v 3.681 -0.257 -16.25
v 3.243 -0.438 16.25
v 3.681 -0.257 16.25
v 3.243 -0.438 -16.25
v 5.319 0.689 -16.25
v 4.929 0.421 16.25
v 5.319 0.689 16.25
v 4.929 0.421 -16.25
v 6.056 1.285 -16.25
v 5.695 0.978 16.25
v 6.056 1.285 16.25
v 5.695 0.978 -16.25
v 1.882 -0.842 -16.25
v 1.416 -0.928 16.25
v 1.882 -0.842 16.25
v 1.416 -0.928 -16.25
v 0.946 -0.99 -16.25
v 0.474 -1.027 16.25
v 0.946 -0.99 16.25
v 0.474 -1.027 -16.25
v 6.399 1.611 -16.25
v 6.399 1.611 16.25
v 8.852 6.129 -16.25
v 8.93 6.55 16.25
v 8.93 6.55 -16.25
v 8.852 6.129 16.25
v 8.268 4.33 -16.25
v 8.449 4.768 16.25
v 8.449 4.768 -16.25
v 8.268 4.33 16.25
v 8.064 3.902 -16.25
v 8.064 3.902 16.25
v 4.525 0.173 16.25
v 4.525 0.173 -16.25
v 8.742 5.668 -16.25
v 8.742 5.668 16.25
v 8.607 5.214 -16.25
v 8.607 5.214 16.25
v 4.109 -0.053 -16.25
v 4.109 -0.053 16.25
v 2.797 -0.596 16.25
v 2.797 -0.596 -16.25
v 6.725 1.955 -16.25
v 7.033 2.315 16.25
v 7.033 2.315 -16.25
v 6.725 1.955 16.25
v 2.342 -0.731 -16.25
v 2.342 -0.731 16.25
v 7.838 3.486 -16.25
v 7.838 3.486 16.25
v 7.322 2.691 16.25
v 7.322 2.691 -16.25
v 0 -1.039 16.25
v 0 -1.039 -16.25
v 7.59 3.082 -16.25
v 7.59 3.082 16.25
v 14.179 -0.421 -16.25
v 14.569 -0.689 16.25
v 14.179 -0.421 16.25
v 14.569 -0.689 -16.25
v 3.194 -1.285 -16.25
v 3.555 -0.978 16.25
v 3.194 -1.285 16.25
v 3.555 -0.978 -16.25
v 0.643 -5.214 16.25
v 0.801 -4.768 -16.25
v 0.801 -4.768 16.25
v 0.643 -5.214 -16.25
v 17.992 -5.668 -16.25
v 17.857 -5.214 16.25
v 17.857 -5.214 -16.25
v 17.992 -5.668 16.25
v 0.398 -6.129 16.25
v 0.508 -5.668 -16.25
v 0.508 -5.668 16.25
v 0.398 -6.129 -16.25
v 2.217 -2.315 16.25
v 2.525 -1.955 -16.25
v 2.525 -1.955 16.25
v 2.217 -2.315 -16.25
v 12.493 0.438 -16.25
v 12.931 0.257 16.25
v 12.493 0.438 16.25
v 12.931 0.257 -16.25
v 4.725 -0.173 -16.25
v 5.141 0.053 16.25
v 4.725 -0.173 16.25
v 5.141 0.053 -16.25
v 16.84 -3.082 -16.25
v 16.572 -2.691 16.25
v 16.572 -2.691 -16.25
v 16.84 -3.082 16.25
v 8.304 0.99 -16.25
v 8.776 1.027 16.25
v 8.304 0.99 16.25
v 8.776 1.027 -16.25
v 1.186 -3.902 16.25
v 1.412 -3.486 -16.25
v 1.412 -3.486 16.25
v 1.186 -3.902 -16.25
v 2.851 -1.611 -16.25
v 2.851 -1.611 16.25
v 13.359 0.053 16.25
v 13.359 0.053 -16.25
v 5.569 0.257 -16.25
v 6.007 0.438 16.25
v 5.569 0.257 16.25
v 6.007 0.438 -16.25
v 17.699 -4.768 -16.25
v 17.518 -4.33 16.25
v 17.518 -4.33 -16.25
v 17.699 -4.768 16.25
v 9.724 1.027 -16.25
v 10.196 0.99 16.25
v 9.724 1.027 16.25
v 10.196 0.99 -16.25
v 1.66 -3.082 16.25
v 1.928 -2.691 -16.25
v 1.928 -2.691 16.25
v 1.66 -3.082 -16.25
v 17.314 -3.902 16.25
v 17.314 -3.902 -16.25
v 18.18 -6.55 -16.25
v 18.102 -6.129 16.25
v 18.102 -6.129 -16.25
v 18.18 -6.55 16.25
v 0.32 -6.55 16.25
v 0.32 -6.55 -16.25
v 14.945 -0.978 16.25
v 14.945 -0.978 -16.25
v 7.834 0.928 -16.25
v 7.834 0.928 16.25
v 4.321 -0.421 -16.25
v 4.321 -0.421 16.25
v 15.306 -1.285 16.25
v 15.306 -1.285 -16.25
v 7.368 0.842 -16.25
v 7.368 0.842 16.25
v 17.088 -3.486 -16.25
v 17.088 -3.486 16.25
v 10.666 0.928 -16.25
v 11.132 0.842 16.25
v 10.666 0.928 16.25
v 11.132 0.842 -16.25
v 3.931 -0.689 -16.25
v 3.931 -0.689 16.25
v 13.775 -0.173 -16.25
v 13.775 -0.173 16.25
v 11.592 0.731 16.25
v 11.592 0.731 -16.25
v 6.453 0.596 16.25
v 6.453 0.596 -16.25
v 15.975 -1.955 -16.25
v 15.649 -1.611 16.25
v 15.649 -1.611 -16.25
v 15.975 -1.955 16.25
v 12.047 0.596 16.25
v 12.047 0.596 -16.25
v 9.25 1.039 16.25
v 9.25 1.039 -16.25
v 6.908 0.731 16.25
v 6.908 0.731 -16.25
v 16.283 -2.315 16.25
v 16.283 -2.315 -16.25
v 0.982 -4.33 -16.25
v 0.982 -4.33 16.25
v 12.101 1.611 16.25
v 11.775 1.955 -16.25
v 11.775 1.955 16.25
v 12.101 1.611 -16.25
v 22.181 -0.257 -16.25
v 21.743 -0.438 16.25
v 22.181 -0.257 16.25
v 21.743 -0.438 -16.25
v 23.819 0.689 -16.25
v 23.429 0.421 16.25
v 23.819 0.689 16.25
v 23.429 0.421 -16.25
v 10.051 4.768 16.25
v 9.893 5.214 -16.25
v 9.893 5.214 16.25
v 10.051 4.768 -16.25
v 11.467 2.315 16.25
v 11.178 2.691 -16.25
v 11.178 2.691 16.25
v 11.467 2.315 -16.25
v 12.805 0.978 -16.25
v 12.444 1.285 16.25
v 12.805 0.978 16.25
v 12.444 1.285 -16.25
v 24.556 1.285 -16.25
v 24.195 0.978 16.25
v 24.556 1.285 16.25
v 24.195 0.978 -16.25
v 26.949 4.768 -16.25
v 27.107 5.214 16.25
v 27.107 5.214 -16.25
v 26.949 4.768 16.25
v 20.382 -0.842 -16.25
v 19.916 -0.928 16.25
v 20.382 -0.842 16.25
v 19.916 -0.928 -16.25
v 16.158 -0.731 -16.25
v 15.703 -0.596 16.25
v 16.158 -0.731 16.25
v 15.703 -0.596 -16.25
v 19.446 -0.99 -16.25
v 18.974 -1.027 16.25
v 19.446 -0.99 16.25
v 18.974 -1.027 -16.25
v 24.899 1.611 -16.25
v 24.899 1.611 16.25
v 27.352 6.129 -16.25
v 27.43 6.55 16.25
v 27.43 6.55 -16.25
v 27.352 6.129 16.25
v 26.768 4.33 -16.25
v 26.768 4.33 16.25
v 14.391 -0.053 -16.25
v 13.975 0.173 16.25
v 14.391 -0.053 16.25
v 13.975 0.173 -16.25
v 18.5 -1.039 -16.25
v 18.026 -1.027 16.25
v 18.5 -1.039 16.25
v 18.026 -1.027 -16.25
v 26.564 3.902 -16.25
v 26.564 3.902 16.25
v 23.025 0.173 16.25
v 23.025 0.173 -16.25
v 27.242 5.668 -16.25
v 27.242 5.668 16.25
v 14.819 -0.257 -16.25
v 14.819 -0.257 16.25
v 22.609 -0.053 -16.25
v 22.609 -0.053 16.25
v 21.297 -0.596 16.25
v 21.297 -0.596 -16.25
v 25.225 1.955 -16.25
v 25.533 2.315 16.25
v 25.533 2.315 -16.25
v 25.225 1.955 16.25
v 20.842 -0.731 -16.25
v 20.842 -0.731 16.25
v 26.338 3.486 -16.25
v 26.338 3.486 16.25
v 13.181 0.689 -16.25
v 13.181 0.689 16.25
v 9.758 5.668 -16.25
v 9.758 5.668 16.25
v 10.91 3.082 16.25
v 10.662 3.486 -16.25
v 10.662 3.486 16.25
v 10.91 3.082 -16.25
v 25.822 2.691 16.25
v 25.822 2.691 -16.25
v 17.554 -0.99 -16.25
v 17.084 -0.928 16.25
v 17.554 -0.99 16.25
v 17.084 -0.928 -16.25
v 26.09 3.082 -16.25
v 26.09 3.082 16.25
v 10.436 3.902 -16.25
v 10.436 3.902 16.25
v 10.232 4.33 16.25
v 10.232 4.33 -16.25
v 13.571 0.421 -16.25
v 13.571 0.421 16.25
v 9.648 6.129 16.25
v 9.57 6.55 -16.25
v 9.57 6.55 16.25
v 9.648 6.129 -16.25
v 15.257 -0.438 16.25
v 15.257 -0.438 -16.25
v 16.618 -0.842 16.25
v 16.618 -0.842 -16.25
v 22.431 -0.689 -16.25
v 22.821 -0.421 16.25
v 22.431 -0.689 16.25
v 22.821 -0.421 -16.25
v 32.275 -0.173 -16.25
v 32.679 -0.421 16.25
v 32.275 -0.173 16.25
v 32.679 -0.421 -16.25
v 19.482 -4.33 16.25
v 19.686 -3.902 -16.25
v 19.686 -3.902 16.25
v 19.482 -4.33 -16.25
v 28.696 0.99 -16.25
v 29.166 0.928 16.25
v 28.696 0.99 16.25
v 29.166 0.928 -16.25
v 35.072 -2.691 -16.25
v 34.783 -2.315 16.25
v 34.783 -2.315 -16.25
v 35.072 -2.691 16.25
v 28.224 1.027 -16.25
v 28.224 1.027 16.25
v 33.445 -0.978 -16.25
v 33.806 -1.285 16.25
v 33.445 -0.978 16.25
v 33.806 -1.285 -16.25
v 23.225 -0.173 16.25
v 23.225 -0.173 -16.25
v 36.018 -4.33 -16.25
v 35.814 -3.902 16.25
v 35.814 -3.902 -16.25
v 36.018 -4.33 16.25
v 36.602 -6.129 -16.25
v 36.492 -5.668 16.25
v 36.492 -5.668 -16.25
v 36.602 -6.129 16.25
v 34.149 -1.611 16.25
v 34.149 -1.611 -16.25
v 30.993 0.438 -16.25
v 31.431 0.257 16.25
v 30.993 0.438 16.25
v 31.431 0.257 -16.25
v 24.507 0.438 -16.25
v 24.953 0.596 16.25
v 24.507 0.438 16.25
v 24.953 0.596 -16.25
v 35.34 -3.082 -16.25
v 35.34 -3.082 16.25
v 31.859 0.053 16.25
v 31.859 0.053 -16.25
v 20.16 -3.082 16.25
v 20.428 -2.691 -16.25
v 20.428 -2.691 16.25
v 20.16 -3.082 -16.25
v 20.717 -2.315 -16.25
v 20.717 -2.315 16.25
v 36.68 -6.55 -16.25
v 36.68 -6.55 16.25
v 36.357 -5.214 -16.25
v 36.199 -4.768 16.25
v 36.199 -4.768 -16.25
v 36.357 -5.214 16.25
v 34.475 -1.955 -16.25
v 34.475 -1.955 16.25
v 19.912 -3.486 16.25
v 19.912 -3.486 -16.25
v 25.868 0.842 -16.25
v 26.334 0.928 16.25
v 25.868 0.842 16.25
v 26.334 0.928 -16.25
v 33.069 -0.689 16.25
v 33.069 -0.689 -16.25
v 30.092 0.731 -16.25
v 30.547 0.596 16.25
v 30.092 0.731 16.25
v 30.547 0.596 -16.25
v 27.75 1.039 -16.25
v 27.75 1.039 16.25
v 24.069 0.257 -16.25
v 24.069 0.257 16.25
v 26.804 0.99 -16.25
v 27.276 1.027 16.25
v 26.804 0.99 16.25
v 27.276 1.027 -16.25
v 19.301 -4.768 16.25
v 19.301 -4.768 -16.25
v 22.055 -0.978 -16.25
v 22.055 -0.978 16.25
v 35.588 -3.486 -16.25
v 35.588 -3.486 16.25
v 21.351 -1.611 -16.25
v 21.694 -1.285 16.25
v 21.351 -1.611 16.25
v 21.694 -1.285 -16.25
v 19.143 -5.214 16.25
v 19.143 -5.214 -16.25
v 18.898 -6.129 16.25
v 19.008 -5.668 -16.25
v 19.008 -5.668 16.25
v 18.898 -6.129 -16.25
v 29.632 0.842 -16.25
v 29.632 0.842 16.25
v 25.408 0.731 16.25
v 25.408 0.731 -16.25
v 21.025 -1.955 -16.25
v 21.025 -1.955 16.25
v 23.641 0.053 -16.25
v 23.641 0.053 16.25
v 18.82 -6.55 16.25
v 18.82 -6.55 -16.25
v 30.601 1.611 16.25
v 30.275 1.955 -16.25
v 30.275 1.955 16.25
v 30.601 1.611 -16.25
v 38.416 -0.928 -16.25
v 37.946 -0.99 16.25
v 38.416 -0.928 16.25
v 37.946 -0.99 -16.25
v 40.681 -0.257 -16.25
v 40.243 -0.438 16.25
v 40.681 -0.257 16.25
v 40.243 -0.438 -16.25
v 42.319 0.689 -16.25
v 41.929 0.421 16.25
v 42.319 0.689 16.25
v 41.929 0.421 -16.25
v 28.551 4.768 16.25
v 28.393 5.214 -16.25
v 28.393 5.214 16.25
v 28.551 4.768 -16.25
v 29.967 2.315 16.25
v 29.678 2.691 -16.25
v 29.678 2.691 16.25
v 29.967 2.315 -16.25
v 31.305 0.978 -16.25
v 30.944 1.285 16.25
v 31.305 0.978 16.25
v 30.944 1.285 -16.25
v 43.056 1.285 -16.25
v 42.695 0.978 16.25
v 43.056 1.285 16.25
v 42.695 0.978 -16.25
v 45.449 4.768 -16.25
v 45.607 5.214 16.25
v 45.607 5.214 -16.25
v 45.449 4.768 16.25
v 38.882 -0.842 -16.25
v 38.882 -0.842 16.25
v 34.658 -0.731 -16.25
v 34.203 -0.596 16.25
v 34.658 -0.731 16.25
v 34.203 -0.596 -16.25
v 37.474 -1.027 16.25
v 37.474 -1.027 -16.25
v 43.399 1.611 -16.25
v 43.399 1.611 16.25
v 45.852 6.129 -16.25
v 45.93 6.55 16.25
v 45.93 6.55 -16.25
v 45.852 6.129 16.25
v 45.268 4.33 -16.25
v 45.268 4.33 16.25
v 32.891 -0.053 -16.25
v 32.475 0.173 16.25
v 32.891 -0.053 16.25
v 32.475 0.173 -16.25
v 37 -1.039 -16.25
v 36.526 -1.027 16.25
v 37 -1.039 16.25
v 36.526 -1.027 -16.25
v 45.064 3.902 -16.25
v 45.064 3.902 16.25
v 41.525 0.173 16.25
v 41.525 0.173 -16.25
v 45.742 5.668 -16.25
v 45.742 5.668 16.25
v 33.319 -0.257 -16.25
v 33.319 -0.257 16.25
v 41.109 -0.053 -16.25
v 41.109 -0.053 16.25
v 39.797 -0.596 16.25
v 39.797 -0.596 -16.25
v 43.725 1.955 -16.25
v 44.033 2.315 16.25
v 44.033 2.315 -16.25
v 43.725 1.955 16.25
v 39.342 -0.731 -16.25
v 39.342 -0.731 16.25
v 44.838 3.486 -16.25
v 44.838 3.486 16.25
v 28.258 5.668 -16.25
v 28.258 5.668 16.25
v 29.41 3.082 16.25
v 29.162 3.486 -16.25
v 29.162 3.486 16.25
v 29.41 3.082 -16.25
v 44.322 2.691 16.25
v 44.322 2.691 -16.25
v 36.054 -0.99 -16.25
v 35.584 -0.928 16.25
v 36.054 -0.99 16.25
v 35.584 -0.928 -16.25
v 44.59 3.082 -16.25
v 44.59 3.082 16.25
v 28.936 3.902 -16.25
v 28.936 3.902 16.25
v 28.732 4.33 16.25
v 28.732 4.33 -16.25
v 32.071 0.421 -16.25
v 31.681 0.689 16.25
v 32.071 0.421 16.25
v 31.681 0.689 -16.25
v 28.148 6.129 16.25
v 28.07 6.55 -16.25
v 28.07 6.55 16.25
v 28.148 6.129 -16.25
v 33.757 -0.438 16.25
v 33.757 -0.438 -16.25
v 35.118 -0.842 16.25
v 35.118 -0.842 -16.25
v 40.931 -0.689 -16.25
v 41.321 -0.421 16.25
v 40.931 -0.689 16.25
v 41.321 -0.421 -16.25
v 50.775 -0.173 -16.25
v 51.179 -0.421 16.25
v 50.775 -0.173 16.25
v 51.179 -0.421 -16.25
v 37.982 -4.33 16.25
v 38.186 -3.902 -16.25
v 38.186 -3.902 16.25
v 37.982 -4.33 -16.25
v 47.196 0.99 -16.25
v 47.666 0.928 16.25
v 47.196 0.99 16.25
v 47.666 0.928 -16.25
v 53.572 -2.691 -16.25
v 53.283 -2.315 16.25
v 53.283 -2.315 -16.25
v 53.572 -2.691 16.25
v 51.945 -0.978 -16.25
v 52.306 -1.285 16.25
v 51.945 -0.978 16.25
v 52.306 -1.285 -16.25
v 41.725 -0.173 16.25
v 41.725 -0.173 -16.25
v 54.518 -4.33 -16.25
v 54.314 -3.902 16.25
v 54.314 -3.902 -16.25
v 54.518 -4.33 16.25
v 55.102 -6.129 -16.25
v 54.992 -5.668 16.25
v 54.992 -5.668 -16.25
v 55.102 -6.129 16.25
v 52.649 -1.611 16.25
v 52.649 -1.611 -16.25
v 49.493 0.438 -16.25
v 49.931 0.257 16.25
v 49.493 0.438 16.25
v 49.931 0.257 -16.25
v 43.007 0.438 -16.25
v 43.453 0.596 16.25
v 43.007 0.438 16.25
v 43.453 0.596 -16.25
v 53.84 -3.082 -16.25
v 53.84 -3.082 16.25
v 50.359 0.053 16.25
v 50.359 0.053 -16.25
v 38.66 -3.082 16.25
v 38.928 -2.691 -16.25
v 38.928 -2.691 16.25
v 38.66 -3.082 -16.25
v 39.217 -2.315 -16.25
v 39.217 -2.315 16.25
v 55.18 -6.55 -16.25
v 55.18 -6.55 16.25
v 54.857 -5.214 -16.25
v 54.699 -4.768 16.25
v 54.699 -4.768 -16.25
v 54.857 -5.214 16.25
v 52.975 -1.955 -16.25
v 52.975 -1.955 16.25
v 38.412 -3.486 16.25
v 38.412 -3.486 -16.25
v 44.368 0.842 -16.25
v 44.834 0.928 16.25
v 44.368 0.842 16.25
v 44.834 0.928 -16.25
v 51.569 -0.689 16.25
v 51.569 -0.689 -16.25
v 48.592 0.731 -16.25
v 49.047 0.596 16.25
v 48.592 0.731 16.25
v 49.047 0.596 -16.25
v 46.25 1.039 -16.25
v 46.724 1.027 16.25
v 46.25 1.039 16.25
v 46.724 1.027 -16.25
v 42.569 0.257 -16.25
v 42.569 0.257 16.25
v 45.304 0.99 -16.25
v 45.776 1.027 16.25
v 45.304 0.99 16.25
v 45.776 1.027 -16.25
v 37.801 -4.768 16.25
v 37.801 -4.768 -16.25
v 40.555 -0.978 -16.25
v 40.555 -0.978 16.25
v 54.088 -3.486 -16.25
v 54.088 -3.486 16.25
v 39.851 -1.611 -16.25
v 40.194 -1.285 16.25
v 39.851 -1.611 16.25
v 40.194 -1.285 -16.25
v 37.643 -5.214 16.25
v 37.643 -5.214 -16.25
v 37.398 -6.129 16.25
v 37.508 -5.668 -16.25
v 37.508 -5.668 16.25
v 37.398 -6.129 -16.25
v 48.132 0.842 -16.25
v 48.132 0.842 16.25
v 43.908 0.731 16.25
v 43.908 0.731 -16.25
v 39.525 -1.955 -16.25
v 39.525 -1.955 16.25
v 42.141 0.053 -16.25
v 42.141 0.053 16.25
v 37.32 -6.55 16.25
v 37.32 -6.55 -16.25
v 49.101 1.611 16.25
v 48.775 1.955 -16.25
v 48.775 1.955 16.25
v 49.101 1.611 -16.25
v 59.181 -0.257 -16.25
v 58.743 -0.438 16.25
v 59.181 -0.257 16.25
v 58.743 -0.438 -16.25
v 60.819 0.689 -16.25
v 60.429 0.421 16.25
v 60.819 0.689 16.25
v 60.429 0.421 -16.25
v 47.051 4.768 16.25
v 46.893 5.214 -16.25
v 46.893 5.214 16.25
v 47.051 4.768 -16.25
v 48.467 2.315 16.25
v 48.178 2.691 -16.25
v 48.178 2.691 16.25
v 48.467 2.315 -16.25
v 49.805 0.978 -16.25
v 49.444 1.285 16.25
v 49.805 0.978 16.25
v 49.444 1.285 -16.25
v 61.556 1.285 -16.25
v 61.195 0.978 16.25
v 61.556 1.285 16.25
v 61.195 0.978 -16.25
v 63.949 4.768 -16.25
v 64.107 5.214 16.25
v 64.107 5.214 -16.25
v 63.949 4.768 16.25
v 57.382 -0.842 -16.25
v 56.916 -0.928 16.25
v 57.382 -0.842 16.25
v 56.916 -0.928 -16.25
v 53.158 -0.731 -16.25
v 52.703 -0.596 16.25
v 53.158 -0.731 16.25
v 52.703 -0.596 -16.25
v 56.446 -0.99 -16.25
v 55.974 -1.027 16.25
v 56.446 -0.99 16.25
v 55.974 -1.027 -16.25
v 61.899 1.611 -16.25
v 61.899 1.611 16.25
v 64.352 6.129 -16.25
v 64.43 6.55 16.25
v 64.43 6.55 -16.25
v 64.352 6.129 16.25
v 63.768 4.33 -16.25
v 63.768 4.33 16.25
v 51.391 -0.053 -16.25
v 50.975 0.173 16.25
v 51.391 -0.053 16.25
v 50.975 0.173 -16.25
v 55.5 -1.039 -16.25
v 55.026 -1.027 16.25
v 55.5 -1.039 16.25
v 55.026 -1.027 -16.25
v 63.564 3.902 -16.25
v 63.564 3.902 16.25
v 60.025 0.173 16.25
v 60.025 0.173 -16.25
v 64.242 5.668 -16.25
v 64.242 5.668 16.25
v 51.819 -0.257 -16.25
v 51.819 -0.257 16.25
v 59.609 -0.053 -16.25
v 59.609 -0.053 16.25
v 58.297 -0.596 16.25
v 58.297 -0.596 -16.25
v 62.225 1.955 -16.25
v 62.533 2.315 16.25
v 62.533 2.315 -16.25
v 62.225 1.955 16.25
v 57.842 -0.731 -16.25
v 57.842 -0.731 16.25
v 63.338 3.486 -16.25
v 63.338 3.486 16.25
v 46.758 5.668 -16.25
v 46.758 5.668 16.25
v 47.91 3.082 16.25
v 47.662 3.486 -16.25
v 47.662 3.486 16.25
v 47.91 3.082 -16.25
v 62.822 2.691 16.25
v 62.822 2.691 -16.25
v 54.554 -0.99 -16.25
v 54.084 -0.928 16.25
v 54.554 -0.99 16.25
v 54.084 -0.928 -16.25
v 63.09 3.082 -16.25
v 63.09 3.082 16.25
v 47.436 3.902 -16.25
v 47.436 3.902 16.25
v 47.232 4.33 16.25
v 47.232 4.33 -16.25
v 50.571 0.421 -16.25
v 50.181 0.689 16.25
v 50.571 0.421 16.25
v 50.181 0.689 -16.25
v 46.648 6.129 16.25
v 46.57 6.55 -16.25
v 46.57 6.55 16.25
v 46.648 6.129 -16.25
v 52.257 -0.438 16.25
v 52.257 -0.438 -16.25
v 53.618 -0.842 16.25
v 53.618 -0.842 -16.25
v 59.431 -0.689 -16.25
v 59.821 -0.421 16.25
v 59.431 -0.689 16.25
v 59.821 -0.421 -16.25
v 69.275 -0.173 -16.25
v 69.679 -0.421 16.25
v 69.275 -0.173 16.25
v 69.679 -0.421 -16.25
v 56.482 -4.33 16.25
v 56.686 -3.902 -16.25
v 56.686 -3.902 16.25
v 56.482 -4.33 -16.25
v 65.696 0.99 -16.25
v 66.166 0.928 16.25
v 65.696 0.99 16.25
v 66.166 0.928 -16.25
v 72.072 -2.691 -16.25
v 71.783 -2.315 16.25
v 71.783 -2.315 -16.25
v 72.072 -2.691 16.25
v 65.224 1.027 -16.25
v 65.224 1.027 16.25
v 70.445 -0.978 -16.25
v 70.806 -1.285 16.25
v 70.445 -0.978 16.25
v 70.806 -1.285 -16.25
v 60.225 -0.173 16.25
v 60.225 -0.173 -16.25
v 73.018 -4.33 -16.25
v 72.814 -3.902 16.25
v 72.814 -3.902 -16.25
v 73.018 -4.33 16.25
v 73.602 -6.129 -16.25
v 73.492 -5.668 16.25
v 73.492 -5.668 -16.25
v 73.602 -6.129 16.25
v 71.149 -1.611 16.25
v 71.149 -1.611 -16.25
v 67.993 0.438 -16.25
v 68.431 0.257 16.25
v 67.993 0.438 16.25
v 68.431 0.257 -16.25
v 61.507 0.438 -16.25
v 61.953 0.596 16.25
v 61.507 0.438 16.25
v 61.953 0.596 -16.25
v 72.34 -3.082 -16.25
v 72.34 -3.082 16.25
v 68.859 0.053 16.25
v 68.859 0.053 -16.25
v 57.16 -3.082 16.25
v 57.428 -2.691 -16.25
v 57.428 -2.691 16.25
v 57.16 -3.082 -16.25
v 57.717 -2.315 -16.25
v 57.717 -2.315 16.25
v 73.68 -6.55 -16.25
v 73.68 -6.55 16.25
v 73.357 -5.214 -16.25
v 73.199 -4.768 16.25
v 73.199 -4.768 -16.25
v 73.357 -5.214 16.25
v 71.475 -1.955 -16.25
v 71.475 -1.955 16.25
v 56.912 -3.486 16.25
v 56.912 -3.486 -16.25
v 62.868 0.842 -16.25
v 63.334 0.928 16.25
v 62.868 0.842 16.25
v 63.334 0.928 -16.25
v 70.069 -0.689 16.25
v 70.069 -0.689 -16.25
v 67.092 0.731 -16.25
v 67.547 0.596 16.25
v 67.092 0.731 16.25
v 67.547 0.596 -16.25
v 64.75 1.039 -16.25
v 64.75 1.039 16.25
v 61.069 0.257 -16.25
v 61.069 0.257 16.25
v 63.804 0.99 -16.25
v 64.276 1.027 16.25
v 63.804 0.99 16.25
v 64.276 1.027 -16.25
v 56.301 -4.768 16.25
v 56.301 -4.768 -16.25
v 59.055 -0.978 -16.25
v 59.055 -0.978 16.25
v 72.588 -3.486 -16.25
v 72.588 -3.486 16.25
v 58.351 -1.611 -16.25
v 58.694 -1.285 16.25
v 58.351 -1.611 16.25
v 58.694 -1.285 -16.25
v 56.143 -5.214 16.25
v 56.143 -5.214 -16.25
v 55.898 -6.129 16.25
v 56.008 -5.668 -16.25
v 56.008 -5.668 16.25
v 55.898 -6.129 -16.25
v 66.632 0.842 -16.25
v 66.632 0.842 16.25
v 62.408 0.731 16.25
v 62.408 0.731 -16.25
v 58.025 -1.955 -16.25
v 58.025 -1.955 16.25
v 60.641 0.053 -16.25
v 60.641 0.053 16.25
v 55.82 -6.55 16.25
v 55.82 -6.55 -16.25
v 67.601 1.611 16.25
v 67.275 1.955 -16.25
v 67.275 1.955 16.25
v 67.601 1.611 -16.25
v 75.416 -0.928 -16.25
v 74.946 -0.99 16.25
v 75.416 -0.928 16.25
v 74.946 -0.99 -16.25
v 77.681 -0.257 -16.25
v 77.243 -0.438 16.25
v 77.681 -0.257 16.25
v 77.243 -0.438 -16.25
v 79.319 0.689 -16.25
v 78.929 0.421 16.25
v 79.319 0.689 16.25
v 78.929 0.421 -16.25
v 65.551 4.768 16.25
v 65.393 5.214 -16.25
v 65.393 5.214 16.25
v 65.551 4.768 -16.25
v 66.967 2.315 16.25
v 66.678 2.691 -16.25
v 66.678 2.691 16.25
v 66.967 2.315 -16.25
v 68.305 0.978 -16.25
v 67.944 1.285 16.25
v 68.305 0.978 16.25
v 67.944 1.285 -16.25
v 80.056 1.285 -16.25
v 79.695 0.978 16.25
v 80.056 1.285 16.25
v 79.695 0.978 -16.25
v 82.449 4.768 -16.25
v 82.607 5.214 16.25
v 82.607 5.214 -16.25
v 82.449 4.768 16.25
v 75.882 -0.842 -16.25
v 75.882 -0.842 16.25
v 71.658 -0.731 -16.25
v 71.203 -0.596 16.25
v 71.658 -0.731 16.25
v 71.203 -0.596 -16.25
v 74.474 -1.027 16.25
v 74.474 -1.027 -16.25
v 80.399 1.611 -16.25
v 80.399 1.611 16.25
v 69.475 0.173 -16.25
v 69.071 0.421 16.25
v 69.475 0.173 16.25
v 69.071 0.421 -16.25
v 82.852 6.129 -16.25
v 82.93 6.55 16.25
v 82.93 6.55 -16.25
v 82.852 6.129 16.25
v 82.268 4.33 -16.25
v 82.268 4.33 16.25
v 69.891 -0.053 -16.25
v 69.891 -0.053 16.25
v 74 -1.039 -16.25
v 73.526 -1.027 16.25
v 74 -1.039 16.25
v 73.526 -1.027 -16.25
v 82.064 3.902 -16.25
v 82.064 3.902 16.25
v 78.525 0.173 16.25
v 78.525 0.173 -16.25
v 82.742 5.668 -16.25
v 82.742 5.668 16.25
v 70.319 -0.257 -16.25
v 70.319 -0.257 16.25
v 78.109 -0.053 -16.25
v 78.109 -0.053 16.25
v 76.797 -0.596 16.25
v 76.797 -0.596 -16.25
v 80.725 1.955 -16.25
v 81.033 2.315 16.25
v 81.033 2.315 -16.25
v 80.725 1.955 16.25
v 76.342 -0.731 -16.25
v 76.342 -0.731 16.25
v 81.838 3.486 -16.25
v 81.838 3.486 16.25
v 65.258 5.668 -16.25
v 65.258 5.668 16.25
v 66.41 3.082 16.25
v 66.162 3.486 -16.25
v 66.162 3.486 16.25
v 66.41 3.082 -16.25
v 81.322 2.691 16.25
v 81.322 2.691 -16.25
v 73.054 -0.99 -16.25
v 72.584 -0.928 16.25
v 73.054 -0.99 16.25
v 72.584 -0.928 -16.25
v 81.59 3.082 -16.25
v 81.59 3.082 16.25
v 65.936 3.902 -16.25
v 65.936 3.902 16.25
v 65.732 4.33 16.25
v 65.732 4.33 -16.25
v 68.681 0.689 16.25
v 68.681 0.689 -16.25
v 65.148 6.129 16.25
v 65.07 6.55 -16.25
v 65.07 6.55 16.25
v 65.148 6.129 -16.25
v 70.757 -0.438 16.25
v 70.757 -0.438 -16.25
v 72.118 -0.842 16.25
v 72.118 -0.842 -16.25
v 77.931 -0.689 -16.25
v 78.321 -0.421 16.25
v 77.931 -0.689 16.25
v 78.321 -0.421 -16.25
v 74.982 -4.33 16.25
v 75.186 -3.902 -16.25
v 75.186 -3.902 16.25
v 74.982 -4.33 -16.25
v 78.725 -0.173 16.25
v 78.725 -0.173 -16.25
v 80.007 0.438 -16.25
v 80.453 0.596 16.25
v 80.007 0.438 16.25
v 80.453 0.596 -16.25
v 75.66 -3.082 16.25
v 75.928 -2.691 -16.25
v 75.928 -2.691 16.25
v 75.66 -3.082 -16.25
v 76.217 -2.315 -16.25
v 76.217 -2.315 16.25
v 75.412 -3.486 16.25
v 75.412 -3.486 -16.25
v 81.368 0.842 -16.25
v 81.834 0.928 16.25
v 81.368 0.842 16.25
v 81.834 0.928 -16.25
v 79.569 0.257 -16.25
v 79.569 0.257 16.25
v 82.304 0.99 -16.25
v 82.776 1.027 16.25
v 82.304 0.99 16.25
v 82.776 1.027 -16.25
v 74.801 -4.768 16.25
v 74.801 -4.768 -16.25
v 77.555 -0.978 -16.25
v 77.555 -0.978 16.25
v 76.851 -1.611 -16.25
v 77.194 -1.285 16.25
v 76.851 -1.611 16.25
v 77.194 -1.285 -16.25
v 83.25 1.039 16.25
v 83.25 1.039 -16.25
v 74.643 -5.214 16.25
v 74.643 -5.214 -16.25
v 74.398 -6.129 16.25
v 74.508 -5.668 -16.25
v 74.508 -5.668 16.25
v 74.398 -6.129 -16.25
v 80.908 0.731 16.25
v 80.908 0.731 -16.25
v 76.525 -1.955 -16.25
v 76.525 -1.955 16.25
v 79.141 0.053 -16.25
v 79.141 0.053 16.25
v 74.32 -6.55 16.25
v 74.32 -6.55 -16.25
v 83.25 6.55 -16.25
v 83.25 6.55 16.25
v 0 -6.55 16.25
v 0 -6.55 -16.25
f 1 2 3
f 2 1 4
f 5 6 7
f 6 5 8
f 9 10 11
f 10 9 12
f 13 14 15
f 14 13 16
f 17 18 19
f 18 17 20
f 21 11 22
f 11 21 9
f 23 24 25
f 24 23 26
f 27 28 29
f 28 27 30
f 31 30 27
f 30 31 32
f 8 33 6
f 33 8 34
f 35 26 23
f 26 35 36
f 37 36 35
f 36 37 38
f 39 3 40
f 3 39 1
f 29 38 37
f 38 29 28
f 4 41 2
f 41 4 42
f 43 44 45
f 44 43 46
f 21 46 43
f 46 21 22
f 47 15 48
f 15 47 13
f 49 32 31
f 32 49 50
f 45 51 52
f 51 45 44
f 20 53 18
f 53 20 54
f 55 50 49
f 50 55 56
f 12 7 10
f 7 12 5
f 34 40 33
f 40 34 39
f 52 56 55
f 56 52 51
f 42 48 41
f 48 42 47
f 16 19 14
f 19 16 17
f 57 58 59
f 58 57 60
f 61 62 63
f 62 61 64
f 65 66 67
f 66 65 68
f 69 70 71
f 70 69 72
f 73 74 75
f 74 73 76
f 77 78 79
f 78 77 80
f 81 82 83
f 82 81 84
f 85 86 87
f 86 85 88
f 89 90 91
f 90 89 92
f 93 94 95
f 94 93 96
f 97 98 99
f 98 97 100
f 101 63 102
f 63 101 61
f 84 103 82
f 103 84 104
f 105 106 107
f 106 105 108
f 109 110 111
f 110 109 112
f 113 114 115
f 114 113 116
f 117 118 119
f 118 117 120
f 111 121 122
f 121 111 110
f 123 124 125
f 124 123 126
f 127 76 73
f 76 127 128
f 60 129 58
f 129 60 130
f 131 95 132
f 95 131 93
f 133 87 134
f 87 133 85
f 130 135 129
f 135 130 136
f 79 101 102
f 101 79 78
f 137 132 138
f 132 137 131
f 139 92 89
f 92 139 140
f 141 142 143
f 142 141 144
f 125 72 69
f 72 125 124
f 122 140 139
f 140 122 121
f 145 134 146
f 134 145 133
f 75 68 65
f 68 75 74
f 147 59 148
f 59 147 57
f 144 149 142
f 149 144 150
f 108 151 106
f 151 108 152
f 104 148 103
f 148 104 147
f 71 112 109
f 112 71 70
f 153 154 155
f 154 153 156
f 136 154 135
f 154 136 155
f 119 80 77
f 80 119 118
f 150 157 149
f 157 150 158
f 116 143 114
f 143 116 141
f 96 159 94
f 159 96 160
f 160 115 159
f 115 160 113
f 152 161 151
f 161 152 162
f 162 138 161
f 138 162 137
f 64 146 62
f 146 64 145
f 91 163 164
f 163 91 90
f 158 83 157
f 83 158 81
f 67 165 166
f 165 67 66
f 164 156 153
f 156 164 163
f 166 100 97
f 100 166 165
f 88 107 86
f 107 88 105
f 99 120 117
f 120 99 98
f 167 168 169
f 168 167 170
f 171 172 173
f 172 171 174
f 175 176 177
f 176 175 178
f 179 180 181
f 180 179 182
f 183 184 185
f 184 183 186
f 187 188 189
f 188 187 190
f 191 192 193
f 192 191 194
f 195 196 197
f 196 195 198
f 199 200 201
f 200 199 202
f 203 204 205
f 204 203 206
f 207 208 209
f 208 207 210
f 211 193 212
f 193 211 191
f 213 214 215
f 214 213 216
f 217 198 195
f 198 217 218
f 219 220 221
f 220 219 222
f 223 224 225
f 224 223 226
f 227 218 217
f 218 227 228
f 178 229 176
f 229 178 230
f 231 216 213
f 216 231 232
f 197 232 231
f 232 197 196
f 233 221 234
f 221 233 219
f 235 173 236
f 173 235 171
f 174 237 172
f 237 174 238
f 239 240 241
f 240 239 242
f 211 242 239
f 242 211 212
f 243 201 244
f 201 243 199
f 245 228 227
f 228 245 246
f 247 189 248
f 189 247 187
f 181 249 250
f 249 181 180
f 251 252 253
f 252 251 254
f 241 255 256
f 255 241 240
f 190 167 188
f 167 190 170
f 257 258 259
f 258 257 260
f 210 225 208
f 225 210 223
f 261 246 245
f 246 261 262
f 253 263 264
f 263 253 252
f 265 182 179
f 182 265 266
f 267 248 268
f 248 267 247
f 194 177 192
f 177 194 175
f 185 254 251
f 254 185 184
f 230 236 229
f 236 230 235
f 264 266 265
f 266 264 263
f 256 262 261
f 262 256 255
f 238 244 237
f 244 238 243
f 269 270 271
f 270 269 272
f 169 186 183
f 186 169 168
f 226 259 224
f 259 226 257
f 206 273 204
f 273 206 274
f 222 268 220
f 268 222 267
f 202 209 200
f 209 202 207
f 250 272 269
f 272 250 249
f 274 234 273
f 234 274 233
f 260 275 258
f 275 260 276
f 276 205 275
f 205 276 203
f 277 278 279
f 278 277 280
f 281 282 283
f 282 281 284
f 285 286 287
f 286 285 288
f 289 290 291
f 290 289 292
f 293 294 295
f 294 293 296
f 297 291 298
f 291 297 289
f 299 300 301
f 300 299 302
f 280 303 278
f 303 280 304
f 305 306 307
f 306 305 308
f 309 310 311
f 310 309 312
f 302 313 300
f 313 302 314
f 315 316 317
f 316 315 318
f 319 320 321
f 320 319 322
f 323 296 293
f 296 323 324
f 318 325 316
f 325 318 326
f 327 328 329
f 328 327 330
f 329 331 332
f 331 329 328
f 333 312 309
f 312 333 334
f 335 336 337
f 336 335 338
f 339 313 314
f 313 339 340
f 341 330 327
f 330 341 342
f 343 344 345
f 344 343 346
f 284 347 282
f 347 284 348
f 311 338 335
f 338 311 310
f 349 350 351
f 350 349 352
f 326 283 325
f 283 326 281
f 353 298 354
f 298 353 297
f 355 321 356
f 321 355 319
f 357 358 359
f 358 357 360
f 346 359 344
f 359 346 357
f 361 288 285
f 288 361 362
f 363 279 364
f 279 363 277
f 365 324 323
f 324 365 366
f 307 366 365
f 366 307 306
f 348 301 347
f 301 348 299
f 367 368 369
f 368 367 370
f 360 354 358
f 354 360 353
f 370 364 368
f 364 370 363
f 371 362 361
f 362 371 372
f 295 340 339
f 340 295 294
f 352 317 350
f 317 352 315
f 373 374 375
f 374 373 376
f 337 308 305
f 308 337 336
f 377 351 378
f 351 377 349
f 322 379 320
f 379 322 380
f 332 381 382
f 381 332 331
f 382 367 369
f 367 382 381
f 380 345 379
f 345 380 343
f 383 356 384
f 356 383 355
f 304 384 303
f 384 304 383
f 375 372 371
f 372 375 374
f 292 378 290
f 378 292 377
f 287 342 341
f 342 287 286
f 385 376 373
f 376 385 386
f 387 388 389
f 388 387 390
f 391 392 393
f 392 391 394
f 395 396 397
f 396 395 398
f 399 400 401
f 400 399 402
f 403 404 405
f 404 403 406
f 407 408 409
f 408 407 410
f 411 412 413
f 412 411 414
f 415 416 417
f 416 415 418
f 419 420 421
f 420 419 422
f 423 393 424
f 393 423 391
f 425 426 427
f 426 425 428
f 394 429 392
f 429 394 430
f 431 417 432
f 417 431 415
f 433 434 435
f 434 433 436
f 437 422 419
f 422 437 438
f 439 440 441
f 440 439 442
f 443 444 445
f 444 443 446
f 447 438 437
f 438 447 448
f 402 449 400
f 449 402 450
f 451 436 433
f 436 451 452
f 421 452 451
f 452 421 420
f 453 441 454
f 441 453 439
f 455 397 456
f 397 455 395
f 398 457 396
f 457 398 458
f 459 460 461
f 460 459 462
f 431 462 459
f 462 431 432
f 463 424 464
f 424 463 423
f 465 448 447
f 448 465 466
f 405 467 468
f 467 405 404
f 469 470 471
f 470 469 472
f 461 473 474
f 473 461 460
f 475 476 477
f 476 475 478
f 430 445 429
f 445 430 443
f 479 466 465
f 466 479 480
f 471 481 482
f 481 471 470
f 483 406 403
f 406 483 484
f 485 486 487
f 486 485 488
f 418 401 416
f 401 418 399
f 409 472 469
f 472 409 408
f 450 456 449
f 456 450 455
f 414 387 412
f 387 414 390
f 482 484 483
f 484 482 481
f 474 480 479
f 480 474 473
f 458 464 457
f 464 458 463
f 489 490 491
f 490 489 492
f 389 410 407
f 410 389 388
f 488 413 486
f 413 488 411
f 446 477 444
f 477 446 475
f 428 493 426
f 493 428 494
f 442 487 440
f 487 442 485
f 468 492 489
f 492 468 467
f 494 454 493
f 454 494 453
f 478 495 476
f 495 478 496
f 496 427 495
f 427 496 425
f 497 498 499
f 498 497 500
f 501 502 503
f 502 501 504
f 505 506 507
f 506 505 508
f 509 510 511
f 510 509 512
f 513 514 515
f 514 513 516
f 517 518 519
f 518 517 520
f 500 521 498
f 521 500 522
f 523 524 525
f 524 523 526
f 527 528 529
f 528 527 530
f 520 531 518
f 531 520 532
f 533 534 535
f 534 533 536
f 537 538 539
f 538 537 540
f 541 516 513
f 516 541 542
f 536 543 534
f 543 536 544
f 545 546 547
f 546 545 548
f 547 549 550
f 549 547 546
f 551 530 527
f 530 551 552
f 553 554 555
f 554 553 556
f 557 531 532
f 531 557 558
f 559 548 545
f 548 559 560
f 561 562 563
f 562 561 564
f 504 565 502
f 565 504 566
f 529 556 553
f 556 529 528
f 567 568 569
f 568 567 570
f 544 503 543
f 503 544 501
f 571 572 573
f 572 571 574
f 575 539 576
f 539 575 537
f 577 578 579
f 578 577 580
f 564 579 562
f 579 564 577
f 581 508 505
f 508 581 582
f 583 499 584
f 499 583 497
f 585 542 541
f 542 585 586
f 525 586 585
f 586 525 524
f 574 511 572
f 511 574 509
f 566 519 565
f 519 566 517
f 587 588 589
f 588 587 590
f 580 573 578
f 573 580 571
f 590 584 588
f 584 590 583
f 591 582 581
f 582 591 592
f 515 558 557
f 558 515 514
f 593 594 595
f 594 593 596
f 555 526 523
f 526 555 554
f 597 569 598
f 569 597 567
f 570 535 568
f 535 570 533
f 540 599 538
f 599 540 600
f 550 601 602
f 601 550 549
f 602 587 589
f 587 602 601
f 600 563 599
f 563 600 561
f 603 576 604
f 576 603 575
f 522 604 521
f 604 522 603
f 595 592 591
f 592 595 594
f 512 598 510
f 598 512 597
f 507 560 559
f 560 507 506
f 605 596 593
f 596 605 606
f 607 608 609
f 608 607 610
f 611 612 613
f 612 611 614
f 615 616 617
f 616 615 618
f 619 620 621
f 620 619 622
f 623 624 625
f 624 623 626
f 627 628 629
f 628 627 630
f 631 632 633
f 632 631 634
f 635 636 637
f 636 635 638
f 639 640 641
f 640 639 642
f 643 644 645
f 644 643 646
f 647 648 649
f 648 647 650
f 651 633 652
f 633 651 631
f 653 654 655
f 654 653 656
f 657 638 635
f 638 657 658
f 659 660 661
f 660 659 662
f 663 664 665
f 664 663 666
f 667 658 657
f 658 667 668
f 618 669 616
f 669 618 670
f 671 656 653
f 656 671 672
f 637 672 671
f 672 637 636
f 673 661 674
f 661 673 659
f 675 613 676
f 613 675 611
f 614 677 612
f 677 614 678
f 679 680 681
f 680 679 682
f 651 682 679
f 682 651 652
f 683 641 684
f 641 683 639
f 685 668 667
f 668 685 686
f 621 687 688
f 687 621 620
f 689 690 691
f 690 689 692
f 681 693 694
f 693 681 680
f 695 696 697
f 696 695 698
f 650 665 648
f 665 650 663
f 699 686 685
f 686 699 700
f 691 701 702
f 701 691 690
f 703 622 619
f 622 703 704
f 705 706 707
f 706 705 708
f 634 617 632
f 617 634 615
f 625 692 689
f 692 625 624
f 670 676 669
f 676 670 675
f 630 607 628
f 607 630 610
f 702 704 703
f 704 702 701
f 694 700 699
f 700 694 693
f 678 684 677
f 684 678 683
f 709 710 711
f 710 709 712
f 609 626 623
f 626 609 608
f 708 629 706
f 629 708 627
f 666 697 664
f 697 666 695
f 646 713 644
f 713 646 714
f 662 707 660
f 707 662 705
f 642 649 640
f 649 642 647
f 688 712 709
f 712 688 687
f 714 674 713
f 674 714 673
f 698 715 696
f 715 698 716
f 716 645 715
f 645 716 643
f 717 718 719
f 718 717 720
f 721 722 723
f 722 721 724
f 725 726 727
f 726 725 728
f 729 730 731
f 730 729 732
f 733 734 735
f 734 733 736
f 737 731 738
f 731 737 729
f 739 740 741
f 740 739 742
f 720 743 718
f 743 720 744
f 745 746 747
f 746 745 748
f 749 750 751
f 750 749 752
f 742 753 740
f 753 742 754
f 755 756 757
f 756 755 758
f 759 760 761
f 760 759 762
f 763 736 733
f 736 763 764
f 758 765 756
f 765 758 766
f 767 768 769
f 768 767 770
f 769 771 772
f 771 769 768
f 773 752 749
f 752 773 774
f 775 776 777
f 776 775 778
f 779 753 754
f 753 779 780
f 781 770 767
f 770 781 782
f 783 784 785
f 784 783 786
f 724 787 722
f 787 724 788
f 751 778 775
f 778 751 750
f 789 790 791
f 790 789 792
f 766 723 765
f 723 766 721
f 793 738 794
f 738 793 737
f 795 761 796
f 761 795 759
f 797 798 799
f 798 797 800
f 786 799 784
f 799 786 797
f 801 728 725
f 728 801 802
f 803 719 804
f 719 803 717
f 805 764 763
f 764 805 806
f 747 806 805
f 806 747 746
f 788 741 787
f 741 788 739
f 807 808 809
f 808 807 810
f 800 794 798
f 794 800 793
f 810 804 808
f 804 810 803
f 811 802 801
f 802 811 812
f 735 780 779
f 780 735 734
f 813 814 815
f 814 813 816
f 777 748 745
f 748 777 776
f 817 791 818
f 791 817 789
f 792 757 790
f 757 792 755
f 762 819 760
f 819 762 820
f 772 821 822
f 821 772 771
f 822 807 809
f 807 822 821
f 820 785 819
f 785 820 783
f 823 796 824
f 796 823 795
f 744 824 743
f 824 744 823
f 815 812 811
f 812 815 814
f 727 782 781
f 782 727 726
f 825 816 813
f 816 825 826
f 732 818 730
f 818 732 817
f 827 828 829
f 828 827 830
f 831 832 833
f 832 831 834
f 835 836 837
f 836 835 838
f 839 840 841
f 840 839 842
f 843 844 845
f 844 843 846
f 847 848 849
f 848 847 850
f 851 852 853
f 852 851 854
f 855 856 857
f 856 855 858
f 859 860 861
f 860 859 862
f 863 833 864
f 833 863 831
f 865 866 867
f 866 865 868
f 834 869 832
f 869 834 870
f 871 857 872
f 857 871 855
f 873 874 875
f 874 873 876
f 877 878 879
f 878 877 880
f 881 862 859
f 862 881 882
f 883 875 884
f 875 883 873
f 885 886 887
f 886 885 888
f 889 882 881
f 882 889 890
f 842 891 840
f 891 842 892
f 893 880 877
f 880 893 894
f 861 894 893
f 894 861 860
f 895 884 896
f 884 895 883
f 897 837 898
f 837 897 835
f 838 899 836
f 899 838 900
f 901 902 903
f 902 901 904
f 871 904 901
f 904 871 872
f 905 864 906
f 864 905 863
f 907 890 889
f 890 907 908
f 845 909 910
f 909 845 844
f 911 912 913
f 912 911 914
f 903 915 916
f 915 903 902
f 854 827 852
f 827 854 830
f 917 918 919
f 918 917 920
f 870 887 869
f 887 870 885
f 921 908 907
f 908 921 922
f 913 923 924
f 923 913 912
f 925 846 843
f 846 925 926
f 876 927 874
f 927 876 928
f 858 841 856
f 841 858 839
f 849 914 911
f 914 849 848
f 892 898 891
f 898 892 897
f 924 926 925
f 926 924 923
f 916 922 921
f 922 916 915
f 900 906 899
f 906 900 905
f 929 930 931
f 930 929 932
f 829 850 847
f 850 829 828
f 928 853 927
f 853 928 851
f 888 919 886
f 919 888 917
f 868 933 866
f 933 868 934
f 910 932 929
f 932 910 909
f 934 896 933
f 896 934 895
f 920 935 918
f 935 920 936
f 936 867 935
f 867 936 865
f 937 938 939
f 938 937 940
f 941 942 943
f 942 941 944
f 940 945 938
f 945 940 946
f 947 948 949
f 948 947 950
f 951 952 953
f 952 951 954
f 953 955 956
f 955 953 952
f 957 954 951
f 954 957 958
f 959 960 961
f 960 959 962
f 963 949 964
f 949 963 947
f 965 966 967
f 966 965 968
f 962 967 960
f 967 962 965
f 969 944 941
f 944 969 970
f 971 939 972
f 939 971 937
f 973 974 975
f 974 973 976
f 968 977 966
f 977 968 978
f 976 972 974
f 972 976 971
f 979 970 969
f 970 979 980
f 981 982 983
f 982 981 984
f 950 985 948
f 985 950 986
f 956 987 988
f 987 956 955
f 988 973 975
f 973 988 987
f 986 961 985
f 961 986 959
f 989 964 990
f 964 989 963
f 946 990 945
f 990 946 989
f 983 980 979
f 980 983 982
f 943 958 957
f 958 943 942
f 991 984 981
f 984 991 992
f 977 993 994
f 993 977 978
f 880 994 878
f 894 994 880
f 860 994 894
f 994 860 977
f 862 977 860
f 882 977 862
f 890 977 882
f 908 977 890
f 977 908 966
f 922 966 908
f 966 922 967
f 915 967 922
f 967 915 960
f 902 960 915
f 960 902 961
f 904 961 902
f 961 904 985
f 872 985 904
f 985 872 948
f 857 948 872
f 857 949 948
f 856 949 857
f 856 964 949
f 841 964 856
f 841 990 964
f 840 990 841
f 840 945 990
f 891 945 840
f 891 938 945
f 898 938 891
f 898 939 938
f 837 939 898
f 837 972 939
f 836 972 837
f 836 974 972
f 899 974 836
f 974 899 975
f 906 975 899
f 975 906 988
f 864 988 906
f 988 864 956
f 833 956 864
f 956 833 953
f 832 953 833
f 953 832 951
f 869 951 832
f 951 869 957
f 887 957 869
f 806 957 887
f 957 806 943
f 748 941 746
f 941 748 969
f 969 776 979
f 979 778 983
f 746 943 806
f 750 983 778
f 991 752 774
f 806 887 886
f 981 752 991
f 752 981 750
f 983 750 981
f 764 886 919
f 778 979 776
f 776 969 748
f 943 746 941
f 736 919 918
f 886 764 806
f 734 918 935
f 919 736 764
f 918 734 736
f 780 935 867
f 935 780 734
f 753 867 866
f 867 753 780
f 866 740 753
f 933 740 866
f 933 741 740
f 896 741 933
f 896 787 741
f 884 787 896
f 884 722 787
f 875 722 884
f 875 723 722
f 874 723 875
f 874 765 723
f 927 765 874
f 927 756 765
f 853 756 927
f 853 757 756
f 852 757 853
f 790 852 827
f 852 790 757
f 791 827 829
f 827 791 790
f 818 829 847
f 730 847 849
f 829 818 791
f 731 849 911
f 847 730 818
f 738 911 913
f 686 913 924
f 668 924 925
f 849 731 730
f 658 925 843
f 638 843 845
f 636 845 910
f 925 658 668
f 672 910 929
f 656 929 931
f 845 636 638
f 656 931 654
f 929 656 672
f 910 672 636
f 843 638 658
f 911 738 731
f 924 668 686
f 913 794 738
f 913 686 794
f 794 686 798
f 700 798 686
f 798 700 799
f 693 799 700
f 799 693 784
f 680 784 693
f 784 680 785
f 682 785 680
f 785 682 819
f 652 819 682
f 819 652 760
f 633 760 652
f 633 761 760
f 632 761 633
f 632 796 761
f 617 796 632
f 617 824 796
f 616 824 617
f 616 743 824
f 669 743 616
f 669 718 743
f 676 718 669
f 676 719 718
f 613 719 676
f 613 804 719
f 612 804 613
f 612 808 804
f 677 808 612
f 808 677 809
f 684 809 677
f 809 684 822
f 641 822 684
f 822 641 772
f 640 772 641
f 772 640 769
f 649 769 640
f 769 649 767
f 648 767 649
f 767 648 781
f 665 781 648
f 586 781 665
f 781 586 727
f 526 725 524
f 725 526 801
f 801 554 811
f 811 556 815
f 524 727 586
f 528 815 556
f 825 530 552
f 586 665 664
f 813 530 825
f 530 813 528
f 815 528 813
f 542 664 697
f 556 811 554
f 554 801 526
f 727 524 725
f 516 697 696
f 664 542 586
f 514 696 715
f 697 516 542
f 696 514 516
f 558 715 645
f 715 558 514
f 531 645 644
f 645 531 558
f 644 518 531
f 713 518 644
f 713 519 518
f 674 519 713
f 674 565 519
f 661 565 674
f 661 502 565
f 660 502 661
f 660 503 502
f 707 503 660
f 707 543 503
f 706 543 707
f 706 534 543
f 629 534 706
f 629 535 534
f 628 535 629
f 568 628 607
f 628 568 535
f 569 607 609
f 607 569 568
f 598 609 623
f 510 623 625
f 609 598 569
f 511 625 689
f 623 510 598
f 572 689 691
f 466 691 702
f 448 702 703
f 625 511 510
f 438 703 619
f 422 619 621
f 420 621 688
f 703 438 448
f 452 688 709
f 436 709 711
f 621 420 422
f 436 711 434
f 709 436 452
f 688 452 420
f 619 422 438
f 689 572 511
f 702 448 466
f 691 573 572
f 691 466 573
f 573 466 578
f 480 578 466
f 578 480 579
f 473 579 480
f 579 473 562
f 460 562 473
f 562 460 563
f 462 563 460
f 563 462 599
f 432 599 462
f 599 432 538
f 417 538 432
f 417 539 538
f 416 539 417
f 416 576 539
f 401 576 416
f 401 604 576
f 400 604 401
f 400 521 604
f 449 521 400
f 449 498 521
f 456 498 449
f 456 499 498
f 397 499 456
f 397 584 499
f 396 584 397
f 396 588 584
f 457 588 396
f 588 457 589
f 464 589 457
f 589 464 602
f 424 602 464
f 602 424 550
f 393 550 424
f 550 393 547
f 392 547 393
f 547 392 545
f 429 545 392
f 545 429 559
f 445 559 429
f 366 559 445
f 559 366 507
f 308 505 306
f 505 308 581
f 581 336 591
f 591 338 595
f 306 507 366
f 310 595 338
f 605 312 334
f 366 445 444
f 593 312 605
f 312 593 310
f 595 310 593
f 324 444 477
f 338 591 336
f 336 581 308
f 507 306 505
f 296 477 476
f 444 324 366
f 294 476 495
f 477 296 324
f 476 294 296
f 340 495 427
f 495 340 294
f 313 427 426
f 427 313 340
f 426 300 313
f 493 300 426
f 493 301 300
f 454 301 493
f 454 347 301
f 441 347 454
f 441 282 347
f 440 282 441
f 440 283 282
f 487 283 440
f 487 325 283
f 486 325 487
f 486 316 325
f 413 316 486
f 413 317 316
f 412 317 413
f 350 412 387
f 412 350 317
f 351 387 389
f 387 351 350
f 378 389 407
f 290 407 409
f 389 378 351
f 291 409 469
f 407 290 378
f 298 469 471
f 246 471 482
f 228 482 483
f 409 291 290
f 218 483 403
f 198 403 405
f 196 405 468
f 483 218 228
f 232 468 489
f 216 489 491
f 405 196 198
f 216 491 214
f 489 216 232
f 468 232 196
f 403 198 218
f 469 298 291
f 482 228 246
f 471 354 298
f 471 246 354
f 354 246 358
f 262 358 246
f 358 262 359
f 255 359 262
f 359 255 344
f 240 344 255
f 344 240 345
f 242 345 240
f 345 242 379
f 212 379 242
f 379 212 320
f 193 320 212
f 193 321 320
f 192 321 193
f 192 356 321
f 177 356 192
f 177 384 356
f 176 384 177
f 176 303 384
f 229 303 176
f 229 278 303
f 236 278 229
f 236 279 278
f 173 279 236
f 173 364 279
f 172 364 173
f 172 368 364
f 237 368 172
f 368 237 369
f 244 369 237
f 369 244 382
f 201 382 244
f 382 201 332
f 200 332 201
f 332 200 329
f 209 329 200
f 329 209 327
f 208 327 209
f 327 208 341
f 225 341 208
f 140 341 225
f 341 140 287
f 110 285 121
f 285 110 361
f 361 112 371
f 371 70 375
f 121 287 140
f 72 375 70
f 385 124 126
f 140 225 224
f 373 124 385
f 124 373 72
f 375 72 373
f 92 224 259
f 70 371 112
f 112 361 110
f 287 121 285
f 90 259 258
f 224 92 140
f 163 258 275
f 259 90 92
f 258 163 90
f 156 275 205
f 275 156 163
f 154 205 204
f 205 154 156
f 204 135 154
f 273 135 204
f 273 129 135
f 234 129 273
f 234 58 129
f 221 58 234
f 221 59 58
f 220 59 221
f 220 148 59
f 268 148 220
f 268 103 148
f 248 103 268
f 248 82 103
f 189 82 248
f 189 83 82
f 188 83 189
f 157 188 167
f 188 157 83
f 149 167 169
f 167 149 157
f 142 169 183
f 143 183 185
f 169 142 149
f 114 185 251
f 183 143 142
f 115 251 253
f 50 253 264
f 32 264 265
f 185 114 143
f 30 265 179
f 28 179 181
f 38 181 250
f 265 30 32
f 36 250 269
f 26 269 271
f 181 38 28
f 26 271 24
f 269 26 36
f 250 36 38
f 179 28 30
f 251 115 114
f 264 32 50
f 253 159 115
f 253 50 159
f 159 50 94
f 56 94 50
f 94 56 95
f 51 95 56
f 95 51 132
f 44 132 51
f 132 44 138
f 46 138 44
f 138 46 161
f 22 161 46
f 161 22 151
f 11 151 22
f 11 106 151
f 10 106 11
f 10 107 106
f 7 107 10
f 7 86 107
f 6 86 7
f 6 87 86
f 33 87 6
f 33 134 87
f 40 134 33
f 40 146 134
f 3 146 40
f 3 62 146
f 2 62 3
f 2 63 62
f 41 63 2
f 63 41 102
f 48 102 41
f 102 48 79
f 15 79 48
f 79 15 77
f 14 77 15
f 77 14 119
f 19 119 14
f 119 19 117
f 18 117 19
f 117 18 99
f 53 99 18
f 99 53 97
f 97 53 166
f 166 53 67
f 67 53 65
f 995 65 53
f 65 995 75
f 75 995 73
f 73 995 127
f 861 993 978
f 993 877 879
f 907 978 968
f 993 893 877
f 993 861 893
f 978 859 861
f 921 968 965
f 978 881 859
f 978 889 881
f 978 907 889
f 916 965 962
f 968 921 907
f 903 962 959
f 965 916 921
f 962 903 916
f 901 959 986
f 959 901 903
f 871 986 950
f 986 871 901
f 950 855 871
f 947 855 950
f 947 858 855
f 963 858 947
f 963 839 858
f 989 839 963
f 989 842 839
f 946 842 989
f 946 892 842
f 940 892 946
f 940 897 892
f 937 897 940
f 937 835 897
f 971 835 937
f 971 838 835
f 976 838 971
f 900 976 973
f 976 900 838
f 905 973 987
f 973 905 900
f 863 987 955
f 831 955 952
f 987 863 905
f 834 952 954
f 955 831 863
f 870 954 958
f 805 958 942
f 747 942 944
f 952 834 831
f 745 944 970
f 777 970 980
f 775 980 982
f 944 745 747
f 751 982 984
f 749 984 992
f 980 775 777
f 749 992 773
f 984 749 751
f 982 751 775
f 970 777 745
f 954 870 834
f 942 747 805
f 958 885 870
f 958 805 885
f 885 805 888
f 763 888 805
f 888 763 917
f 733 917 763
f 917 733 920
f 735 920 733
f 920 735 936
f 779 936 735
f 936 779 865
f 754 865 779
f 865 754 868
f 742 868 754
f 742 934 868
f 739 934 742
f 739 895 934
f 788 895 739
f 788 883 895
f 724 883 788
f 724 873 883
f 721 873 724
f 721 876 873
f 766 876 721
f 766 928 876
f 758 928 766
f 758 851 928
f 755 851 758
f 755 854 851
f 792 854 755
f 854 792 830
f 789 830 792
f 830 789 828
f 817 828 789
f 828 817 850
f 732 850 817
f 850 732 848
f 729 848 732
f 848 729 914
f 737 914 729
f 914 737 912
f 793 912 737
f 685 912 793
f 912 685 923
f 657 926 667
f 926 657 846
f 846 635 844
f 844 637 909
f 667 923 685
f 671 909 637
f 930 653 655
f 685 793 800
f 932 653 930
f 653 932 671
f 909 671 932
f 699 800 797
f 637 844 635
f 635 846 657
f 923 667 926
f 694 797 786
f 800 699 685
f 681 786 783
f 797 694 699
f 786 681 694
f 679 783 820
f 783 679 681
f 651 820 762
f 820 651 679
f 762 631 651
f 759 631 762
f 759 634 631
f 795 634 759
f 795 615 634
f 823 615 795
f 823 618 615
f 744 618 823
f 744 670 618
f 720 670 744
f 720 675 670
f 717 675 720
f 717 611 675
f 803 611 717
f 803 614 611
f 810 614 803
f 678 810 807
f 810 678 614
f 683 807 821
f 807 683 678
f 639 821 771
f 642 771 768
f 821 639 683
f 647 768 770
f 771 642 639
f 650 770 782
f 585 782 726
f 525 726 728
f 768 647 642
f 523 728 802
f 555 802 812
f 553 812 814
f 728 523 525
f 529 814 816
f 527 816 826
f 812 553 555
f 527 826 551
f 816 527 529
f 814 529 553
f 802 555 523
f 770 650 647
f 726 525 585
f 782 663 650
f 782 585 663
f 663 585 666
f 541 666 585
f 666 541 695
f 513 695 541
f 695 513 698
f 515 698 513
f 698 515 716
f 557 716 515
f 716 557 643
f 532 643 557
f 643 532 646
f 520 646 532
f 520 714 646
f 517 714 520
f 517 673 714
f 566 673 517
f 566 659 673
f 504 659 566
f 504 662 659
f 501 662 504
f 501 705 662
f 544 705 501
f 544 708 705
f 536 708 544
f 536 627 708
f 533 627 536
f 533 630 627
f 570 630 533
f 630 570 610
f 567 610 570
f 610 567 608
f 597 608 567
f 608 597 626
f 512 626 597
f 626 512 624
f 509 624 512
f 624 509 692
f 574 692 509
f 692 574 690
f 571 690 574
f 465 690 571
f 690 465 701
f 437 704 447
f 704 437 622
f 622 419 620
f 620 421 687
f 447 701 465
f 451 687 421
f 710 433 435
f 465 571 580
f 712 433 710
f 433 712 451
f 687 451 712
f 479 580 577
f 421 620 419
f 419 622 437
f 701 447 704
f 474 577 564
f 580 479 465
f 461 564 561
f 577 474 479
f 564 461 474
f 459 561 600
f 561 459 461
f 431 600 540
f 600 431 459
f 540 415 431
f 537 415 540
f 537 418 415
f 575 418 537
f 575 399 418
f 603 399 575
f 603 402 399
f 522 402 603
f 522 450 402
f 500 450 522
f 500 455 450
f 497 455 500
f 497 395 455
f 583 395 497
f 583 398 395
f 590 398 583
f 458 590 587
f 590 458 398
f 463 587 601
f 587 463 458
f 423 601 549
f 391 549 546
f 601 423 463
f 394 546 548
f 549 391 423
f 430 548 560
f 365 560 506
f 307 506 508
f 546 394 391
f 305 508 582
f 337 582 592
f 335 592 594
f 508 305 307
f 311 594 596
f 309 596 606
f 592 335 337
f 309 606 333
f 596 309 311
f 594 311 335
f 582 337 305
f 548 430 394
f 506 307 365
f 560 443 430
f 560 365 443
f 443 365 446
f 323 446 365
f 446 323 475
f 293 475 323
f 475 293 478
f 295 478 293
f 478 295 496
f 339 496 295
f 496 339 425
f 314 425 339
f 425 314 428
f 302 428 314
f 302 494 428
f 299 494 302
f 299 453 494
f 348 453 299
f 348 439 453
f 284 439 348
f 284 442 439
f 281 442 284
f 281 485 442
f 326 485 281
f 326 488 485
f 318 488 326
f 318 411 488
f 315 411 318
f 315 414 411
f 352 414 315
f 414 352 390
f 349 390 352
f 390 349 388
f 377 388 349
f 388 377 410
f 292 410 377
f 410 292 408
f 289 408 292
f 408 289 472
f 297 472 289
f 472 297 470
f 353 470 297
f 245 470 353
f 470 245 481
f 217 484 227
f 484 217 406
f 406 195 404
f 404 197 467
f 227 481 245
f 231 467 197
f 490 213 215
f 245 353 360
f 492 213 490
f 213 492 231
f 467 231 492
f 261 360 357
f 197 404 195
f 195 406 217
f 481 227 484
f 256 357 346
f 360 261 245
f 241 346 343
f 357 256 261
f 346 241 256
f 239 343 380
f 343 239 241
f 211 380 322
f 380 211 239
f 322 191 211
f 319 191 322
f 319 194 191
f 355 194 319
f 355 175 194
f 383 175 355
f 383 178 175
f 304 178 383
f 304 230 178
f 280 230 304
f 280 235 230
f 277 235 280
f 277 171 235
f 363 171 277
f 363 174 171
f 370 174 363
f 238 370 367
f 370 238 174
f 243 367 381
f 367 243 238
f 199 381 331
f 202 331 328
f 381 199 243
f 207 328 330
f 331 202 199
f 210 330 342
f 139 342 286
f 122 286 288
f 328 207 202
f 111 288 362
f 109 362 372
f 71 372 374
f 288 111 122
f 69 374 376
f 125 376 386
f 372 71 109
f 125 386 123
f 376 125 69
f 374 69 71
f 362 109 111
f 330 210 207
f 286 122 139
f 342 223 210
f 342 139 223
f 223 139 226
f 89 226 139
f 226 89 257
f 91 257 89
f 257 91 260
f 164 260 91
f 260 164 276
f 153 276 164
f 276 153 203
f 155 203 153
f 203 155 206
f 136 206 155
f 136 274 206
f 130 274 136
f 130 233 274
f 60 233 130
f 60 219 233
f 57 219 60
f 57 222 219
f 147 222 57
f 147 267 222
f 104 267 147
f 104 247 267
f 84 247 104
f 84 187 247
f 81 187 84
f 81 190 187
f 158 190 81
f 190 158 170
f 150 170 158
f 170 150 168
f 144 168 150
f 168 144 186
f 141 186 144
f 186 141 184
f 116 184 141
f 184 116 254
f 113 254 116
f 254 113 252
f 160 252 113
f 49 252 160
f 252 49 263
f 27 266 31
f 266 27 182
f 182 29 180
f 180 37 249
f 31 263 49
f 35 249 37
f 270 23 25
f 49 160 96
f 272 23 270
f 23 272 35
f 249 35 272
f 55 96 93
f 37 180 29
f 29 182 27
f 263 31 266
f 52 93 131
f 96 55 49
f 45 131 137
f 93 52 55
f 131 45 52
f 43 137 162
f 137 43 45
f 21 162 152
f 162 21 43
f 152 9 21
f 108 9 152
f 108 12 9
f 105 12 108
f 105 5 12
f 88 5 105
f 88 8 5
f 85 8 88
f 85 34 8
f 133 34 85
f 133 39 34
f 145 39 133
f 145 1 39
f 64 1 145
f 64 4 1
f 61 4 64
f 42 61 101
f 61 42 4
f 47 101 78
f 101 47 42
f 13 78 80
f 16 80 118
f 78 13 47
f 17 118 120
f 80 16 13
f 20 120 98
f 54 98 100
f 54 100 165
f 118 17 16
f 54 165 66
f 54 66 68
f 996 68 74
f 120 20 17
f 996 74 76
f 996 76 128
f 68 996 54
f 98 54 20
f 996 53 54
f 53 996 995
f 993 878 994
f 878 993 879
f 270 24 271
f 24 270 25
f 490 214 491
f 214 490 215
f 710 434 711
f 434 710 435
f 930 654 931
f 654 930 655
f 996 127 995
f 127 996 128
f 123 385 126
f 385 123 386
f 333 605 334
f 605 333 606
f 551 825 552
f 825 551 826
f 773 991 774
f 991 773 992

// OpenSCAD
$fn=120;

//cell_type = 1: "18650", 2: "21700"
cell_type = 1;
cell_dia = (cell_type == 1) ? 18.1 : //"18650"
           (cell_type == 2) ? 21.3 : 0; //"21700"

cell_h = (cell_type == 1) ? 65/2 :
         (cell_type == 2) ? 35 : 0; // 70/2

echo(cell_type  = cell_type);

// the width is less than the cell diameter to avoid the long thin walls
width = cell_dia - 5;

// the seperation (minimum walll thickness) should at least be equal to the nozzle diameter
// v_sep is actually the wall thickness between two alternating cells (ie. the diagonal, jf c^2 = a^2+b^2) 
h_sep=0.4;
v_sep = 0.4;
cell_no=10;

module cells()
{
for (i=[0:cell_no-1]){
    x = 0.5*(cell_dia+h_sep);
    c = cell_dia + v_sep;
    y = sqrt( c*c - x*x);
    translate ([i*x, 0.5*pow(-1,i)*y, 0]) cylinder (d=cell_dia, h=cell_h+1, center=true);
    }
}

module block()
{
    x = (cell_no-1)*(cell_dia+h_sep);
    translate ([0.25*x,0,0]) cube ([0.5*x, width ,cell_h], center=true);
}

//cells();
difference ()
{
    block();
    cells();
}    
